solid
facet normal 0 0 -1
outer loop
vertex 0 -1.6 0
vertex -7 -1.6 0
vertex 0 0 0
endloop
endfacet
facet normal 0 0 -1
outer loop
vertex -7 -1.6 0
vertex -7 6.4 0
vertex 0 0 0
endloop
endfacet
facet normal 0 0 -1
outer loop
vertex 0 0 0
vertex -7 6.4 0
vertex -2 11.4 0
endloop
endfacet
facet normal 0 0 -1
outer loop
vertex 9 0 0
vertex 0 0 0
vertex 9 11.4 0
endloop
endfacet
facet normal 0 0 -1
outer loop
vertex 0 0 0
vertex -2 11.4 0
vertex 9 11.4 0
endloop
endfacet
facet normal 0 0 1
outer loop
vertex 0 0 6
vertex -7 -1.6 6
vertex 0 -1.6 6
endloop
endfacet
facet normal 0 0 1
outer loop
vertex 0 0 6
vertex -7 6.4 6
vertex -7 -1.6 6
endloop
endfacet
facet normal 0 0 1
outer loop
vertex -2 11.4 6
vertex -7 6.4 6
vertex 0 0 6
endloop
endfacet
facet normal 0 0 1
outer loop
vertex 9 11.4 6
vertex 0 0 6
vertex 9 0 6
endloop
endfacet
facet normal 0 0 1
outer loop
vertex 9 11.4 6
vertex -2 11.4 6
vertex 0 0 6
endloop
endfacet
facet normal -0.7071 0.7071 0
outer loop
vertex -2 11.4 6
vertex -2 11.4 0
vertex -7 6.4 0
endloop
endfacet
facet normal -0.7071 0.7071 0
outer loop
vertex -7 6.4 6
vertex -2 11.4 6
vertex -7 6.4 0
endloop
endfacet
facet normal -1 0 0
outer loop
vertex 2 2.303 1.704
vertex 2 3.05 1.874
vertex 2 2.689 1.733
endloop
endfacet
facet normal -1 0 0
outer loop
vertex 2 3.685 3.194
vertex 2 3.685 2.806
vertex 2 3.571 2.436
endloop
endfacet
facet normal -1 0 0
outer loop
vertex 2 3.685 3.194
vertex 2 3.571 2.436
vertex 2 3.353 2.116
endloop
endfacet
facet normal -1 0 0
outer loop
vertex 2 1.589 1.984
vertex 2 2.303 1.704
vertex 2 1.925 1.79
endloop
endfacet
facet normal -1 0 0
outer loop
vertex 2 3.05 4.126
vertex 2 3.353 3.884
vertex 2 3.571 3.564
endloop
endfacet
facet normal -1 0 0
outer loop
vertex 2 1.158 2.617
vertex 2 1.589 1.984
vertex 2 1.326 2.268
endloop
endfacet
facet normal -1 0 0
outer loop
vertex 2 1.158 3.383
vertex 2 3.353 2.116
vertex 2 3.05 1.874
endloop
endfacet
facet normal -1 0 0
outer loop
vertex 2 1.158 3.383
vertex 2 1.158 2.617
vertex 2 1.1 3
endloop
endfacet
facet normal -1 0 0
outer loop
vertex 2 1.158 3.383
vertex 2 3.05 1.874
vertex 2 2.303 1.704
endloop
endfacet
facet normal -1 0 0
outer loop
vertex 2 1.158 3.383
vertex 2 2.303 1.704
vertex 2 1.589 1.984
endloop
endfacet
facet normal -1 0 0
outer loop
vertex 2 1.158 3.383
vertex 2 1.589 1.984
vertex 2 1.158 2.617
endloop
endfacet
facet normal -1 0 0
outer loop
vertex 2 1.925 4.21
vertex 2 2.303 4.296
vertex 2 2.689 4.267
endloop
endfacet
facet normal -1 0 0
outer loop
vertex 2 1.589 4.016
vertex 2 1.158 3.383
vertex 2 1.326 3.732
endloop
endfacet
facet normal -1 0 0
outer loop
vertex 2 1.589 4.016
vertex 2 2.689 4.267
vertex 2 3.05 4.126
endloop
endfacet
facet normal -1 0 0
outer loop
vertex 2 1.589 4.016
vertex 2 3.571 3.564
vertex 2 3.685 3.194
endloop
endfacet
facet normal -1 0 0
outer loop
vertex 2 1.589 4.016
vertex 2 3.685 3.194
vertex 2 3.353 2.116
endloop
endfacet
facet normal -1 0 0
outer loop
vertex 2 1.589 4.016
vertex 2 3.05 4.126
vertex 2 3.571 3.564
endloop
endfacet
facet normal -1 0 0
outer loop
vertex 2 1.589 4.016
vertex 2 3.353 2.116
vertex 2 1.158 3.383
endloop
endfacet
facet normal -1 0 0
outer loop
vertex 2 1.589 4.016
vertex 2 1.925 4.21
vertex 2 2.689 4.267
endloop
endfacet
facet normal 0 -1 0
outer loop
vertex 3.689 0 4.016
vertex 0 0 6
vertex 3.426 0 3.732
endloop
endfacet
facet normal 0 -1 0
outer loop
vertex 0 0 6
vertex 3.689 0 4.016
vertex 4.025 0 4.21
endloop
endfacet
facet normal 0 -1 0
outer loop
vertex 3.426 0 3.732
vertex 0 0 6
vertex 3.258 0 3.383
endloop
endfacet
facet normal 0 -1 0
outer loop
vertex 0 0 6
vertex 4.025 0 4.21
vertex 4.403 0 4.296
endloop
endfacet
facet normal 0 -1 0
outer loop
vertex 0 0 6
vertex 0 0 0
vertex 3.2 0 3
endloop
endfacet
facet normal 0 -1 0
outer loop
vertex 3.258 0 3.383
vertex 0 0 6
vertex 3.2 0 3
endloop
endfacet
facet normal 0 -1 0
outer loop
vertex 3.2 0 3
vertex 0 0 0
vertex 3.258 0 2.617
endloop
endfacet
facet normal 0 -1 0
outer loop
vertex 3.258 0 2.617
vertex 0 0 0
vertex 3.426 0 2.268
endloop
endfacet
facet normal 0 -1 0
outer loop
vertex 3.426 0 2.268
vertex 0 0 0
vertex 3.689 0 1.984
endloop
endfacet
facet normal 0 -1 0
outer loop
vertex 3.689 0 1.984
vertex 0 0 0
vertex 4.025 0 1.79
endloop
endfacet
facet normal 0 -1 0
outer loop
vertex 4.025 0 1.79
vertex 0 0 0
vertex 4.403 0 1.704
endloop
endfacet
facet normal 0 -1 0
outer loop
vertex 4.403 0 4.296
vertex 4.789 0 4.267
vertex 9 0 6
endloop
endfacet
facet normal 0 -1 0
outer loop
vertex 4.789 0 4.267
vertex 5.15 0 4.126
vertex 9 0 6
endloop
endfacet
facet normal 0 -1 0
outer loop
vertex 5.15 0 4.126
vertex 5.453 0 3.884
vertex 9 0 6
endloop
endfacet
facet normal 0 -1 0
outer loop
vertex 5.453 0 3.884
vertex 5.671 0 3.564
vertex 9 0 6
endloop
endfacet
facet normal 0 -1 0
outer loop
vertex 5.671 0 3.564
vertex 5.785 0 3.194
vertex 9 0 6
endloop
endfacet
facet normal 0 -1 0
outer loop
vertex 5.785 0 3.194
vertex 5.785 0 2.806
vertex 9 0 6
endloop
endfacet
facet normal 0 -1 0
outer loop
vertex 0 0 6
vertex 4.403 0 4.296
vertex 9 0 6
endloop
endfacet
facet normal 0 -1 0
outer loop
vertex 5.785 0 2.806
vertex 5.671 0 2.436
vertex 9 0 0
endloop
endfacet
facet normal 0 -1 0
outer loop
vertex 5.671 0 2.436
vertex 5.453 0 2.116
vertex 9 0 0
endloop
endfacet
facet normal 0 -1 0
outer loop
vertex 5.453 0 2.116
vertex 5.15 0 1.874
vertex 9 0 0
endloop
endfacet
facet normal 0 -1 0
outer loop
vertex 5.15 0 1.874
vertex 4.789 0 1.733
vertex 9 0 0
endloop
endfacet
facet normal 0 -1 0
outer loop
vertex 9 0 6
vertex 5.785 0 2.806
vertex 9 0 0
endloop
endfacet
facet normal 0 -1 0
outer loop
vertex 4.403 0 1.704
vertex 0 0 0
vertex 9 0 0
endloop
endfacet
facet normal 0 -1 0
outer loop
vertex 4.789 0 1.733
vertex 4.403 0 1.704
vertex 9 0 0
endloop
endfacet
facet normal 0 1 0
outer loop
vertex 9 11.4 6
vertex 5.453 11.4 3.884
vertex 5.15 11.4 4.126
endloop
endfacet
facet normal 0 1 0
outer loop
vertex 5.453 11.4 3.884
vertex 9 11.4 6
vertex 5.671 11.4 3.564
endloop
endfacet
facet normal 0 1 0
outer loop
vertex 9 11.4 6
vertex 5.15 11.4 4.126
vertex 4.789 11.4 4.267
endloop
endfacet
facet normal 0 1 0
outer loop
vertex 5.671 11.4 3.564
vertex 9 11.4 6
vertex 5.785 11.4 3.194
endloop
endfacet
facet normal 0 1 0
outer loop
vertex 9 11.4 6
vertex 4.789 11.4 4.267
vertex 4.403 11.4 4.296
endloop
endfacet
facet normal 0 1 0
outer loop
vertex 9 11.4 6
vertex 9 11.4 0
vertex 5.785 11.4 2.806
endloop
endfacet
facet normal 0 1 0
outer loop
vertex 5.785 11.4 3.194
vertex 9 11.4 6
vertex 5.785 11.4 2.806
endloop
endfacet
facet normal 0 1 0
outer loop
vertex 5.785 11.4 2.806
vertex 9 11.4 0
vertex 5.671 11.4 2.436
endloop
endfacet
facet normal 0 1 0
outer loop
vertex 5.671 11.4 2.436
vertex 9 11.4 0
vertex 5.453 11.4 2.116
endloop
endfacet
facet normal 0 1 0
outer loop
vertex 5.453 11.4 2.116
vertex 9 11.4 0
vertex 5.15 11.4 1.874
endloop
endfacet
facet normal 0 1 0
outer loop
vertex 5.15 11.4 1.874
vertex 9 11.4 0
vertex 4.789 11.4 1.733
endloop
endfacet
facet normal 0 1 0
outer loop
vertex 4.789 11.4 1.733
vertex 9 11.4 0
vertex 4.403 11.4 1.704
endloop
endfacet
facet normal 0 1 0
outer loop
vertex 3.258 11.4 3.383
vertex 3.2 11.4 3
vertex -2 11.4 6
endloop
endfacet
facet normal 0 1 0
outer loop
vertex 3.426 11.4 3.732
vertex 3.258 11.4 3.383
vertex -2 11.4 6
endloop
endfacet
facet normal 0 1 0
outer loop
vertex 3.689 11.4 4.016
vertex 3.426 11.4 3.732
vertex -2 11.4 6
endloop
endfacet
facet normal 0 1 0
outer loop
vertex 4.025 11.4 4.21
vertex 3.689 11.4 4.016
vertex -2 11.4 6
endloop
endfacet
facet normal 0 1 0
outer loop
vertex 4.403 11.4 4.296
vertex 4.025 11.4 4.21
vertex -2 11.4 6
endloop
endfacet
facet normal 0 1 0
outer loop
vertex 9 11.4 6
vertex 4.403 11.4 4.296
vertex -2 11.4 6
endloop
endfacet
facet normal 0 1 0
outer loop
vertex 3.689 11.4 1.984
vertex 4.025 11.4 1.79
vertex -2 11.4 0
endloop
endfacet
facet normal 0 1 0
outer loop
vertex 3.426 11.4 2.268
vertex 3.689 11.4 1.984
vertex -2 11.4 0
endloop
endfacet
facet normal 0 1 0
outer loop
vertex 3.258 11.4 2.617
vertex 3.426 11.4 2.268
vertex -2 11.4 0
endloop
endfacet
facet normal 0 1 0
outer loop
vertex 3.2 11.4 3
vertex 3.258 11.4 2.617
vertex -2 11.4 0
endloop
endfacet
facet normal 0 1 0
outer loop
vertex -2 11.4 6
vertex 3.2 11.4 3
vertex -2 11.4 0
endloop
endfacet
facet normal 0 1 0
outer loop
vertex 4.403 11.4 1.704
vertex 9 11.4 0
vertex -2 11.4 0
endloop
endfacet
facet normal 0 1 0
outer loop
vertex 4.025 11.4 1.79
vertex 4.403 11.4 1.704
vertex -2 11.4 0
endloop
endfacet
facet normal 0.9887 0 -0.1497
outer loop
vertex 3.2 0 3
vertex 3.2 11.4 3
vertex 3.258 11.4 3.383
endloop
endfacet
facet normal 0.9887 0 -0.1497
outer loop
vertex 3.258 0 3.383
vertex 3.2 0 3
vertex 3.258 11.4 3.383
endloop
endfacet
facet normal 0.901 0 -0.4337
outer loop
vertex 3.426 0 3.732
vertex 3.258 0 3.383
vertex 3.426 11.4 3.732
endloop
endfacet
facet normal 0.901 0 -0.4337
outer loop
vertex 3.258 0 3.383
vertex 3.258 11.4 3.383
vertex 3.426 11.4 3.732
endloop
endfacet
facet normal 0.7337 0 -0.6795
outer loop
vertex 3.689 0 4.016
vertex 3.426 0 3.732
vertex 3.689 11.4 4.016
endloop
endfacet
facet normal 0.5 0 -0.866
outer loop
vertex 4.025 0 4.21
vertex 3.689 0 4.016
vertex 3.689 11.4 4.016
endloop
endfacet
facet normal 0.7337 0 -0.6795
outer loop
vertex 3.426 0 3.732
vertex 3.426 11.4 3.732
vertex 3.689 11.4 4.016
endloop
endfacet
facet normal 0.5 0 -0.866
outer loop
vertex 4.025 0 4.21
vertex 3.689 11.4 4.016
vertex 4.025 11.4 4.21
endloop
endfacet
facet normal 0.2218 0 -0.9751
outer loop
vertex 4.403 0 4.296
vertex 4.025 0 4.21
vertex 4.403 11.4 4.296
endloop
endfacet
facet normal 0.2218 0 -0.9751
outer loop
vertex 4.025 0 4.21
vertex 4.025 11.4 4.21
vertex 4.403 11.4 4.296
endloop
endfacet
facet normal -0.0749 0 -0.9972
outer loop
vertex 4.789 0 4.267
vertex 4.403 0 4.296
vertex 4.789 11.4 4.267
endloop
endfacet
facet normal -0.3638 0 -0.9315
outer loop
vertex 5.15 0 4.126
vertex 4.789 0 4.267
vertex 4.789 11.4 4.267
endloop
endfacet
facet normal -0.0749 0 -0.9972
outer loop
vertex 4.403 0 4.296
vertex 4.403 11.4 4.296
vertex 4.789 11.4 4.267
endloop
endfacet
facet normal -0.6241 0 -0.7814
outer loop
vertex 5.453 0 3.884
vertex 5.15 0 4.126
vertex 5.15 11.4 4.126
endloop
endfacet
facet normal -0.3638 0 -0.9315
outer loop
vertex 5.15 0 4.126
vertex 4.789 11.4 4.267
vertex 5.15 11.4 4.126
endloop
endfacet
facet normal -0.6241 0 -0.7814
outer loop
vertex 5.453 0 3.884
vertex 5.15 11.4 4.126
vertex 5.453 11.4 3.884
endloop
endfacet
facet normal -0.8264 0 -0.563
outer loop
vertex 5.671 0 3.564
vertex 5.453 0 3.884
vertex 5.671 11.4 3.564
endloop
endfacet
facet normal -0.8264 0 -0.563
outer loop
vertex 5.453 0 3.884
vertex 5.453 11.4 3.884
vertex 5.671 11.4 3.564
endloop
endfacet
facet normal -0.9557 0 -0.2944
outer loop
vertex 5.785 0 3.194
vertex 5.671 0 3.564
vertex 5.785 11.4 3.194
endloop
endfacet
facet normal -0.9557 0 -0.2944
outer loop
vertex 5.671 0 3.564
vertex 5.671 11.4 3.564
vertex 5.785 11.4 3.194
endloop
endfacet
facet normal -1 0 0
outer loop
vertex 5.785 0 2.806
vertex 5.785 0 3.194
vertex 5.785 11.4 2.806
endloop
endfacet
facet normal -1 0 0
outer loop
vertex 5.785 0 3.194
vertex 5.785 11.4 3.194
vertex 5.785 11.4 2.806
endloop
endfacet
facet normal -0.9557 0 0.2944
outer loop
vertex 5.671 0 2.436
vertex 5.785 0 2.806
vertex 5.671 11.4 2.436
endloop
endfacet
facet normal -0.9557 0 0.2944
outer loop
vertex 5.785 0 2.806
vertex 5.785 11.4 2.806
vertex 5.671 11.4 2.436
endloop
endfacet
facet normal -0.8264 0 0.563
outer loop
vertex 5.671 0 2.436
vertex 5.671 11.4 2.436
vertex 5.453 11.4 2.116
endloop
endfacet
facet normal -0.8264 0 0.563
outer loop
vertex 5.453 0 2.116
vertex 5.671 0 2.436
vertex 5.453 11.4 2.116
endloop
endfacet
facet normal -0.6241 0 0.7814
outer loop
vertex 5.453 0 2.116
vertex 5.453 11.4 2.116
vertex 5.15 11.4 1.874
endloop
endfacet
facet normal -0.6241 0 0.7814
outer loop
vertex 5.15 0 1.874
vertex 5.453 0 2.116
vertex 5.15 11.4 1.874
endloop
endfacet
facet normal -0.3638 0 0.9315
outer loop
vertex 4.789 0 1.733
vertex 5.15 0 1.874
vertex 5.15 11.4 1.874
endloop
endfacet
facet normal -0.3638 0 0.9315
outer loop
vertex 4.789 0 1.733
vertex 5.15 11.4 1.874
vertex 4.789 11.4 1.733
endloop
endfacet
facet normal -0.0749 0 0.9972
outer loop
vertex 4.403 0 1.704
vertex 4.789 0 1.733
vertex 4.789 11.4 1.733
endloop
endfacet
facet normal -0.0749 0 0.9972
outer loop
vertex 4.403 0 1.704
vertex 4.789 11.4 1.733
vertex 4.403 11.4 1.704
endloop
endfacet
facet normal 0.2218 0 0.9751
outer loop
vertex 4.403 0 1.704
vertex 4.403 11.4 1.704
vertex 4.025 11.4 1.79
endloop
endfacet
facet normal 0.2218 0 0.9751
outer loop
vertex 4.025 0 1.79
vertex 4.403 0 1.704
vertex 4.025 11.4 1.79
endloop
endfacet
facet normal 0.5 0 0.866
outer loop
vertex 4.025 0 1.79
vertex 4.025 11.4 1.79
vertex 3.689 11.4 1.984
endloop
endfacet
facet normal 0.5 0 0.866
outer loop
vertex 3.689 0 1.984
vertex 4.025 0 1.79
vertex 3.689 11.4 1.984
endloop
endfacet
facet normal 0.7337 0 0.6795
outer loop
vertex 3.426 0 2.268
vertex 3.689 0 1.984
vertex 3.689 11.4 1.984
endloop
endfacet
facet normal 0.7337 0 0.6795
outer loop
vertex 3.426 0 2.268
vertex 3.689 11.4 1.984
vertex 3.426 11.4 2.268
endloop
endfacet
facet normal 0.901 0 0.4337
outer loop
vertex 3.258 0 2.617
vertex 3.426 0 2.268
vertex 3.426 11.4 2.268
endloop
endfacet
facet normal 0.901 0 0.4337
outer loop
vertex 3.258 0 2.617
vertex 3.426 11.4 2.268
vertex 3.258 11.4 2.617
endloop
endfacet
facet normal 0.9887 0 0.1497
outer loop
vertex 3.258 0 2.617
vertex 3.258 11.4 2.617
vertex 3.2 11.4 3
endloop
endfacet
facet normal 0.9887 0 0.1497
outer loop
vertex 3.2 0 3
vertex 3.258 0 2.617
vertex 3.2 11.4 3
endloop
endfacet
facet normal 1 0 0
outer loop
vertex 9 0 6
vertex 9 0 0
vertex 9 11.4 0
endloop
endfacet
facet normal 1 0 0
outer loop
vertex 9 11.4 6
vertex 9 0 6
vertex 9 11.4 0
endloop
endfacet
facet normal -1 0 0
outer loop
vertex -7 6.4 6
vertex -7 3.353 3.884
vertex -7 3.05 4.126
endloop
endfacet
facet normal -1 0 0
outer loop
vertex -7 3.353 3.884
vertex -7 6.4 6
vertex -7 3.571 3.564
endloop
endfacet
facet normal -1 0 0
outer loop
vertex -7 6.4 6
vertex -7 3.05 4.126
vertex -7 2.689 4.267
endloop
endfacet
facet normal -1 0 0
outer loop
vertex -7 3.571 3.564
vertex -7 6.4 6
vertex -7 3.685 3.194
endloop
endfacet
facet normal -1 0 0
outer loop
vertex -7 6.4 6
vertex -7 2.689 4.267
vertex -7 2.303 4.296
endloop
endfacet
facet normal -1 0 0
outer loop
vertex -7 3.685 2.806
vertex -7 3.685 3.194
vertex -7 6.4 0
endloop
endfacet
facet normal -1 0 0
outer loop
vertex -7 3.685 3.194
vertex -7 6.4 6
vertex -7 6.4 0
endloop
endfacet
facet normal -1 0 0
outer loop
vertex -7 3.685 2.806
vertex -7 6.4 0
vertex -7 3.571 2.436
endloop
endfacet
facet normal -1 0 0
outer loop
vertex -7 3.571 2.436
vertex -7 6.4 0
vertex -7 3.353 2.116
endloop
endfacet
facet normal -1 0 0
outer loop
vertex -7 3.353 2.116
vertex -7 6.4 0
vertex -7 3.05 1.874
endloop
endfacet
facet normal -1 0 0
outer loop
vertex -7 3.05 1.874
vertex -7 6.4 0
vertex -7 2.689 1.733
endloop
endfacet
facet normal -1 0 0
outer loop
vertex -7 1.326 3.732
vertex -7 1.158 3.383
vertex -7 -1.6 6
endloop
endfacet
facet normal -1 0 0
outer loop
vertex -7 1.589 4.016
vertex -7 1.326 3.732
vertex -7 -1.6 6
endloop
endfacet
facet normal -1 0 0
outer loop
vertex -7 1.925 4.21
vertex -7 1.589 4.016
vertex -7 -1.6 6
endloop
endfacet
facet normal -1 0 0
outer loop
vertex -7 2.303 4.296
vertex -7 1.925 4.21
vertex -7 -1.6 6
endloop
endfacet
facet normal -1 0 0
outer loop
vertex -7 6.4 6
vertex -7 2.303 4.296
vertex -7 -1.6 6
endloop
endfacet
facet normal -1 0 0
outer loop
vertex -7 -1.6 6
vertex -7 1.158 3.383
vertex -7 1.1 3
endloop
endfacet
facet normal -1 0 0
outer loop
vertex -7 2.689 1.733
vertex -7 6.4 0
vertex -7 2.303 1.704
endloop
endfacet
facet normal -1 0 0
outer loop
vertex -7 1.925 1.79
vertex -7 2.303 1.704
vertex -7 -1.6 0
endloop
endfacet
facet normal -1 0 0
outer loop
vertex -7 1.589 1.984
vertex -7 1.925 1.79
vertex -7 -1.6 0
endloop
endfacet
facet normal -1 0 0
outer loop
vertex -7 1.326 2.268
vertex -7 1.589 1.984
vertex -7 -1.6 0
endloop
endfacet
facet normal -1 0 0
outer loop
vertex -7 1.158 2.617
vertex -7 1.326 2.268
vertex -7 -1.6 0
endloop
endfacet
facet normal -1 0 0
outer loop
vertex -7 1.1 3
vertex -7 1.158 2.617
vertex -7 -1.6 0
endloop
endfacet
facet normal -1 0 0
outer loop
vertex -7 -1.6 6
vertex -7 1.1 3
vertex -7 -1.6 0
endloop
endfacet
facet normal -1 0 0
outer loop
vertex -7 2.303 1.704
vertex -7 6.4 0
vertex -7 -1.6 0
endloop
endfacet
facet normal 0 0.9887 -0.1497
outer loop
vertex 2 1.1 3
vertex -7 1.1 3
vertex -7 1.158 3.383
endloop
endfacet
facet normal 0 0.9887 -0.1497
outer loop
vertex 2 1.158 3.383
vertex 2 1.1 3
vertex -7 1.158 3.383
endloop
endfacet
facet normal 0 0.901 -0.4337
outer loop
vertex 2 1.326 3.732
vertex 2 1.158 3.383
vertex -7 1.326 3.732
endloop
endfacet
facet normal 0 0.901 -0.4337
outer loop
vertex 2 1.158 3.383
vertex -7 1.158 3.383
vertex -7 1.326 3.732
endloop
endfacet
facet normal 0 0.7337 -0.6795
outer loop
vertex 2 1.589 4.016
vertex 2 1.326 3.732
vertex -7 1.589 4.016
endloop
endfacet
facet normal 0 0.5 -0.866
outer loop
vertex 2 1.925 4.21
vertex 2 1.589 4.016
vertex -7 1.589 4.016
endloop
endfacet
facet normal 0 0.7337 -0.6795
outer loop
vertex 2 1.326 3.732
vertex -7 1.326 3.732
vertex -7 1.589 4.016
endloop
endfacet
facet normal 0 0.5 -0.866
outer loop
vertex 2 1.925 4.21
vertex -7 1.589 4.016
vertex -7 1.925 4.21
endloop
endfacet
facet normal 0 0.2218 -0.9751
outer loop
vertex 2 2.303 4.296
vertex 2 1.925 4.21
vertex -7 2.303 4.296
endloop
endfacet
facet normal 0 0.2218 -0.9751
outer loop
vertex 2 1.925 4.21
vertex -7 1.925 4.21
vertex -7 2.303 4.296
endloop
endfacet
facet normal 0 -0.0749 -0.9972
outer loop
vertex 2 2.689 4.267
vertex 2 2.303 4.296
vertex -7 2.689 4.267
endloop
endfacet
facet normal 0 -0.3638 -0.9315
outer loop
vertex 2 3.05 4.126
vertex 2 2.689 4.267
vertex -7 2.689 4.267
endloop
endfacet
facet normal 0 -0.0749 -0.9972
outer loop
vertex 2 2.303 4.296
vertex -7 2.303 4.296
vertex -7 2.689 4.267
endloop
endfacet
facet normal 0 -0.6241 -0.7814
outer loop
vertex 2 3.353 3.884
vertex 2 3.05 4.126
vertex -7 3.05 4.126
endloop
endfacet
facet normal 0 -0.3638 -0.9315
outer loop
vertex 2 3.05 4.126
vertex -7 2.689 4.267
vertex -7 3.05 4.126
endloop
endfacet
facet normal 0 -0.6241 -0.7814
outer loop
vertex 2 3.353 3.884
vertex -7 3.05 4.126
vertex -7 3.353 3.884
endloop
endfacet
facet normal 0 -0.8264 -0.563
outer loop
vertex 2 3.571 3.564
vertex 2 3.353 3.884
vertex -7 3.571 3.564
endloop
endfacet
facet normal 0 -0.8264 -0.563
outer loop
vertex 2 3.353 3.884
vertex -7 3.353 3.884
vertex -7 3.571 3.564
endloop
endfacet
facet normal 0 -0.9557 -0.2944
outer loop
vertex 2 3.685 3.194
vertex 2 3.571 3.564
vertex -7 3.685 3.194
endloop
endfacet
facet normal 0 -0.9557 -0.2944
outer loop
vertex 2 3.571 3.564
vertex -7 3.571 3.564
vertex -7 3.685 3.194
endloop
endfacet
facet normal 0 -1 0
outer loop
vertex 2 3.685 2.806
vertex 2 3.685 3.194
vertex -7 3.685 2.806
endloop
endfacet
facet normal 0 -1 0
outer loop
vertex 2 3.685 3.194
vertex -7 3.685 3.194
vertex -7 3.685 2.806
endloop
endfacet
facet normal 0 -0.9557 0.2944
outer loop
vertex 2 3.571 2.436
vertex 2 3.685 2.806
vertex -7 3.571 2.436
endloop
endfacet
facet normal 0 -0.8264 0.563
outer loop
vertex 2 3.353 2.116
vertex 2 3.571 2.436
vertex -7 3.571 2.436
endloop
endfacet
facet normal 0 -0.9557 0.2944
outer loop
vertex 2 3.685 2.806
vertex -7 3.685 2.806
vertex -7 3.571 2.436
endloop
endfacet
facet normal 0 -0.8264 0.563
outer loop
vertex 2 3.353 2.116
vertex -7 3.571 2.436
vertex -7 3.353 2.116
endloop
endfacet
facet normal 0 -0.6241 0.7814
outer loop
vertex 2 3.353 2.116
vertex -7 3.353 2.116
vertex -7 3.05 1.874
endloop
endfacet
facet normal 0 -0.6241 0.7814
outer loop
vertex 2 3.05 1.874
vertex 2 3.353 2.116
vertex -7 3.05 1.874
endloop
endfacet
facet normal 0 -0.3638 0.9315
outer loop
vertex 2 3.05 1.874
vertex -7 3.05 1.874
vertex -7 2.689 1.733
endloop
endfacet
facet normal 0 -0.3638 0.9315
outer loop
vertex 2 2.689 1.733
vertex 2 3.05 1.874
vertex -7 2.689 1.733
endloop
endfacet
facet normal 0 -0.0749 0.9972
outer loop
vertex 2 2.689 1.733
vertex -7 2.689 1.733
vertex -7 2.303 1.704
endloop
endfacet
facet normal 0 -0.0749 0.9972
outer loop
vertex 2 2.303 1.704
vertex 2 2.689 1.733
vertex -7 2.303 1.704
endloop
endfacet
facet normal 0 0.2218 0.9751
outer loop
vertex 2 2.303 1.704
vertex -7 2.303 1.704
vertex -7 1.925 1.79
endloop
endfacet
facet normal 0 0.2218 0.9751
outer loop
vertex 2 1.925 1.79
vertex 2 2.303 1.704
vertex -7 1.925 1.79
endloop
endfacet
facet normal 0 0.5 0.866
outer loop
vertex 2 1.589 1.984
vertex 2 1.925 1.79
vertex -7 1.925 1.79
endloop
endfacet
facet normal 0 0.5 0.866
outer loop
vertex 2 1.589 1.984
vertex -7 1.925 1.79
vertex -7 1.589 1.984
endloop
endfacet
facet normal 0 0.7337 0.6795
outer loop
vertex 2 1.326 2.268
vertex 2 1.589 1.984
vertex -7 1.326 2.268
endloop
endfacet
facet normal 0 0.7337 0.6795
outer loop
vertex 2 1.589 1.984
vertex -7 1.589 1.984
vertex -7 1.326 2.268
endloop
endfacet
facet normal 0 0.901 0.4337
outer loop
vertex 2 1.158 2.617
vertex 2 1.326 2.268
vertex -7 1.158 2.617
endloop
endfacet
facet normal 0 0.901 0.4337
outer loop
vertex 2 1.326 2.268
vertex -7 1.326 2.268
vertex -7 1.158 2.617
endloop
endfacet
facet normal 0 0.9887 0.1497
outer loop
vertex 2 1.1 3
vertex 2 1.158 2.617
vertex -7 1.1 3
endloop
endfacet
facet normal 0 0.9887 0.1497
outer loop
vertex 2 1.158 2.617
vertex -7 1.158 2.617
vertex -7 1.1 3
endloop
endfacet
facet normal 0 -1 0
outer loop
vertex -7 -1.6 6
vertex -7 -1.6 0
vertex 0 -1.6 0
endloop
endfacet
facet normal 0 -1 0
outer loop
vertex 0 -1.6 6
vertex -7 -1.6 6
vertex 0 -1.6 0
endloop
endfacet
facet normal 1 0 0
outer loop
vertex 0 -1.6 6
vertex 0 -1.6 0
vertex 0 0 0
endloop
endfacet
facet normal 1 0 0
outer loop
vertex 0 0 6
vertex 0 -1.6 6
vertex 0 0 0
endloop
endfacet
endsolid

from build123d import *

# Parameters (mm, degrees)
PAD_DEPTH       = 6
SKETCH001_R     = 1.3
POCKET_DEPTH    = 9
SKETCH002_R     = 1.3
POCKET001_DEPTH = 13.001


with BuildPart() as part:
    # Sketch → Pad (new body)
    with BuildSketch(Plane.XY):
        Polygon((-7, -1.6), (0, -1.6), (0, 0), (9, 0), (9, 11.4), (-2, 11.4), (-7, 6.4), align=None)
    extrude(amount=PAD_DEPTH)

    # Sketch001 → Pocket (cut)
    with BuildSketch(Plane(origin=(-7, 0, 0), x_dir=(0, -1, 0), z_dir=(-1, 0, 0))):
        with Locations((-2.4, 3)):
            Circle(SKETCH001_R)
    extrude(amount=-POCKET_DEPTH, mode=Mode.SUBTRACT)

    # Sketch002 → Pocket001 (cut, through all)
    with BuildSketch(Plane(origin=(0, 11.4, 0), x_dir=(-1, 0, 0), z_dir=(0, 1, 0))):
        with Locations((-4.5, 3)):
            Circle(SKETCH002_R)
    extrude(amount=-POCKET001_DEPTH, mode=Mode.SUBTRACT)


solid = part.part
